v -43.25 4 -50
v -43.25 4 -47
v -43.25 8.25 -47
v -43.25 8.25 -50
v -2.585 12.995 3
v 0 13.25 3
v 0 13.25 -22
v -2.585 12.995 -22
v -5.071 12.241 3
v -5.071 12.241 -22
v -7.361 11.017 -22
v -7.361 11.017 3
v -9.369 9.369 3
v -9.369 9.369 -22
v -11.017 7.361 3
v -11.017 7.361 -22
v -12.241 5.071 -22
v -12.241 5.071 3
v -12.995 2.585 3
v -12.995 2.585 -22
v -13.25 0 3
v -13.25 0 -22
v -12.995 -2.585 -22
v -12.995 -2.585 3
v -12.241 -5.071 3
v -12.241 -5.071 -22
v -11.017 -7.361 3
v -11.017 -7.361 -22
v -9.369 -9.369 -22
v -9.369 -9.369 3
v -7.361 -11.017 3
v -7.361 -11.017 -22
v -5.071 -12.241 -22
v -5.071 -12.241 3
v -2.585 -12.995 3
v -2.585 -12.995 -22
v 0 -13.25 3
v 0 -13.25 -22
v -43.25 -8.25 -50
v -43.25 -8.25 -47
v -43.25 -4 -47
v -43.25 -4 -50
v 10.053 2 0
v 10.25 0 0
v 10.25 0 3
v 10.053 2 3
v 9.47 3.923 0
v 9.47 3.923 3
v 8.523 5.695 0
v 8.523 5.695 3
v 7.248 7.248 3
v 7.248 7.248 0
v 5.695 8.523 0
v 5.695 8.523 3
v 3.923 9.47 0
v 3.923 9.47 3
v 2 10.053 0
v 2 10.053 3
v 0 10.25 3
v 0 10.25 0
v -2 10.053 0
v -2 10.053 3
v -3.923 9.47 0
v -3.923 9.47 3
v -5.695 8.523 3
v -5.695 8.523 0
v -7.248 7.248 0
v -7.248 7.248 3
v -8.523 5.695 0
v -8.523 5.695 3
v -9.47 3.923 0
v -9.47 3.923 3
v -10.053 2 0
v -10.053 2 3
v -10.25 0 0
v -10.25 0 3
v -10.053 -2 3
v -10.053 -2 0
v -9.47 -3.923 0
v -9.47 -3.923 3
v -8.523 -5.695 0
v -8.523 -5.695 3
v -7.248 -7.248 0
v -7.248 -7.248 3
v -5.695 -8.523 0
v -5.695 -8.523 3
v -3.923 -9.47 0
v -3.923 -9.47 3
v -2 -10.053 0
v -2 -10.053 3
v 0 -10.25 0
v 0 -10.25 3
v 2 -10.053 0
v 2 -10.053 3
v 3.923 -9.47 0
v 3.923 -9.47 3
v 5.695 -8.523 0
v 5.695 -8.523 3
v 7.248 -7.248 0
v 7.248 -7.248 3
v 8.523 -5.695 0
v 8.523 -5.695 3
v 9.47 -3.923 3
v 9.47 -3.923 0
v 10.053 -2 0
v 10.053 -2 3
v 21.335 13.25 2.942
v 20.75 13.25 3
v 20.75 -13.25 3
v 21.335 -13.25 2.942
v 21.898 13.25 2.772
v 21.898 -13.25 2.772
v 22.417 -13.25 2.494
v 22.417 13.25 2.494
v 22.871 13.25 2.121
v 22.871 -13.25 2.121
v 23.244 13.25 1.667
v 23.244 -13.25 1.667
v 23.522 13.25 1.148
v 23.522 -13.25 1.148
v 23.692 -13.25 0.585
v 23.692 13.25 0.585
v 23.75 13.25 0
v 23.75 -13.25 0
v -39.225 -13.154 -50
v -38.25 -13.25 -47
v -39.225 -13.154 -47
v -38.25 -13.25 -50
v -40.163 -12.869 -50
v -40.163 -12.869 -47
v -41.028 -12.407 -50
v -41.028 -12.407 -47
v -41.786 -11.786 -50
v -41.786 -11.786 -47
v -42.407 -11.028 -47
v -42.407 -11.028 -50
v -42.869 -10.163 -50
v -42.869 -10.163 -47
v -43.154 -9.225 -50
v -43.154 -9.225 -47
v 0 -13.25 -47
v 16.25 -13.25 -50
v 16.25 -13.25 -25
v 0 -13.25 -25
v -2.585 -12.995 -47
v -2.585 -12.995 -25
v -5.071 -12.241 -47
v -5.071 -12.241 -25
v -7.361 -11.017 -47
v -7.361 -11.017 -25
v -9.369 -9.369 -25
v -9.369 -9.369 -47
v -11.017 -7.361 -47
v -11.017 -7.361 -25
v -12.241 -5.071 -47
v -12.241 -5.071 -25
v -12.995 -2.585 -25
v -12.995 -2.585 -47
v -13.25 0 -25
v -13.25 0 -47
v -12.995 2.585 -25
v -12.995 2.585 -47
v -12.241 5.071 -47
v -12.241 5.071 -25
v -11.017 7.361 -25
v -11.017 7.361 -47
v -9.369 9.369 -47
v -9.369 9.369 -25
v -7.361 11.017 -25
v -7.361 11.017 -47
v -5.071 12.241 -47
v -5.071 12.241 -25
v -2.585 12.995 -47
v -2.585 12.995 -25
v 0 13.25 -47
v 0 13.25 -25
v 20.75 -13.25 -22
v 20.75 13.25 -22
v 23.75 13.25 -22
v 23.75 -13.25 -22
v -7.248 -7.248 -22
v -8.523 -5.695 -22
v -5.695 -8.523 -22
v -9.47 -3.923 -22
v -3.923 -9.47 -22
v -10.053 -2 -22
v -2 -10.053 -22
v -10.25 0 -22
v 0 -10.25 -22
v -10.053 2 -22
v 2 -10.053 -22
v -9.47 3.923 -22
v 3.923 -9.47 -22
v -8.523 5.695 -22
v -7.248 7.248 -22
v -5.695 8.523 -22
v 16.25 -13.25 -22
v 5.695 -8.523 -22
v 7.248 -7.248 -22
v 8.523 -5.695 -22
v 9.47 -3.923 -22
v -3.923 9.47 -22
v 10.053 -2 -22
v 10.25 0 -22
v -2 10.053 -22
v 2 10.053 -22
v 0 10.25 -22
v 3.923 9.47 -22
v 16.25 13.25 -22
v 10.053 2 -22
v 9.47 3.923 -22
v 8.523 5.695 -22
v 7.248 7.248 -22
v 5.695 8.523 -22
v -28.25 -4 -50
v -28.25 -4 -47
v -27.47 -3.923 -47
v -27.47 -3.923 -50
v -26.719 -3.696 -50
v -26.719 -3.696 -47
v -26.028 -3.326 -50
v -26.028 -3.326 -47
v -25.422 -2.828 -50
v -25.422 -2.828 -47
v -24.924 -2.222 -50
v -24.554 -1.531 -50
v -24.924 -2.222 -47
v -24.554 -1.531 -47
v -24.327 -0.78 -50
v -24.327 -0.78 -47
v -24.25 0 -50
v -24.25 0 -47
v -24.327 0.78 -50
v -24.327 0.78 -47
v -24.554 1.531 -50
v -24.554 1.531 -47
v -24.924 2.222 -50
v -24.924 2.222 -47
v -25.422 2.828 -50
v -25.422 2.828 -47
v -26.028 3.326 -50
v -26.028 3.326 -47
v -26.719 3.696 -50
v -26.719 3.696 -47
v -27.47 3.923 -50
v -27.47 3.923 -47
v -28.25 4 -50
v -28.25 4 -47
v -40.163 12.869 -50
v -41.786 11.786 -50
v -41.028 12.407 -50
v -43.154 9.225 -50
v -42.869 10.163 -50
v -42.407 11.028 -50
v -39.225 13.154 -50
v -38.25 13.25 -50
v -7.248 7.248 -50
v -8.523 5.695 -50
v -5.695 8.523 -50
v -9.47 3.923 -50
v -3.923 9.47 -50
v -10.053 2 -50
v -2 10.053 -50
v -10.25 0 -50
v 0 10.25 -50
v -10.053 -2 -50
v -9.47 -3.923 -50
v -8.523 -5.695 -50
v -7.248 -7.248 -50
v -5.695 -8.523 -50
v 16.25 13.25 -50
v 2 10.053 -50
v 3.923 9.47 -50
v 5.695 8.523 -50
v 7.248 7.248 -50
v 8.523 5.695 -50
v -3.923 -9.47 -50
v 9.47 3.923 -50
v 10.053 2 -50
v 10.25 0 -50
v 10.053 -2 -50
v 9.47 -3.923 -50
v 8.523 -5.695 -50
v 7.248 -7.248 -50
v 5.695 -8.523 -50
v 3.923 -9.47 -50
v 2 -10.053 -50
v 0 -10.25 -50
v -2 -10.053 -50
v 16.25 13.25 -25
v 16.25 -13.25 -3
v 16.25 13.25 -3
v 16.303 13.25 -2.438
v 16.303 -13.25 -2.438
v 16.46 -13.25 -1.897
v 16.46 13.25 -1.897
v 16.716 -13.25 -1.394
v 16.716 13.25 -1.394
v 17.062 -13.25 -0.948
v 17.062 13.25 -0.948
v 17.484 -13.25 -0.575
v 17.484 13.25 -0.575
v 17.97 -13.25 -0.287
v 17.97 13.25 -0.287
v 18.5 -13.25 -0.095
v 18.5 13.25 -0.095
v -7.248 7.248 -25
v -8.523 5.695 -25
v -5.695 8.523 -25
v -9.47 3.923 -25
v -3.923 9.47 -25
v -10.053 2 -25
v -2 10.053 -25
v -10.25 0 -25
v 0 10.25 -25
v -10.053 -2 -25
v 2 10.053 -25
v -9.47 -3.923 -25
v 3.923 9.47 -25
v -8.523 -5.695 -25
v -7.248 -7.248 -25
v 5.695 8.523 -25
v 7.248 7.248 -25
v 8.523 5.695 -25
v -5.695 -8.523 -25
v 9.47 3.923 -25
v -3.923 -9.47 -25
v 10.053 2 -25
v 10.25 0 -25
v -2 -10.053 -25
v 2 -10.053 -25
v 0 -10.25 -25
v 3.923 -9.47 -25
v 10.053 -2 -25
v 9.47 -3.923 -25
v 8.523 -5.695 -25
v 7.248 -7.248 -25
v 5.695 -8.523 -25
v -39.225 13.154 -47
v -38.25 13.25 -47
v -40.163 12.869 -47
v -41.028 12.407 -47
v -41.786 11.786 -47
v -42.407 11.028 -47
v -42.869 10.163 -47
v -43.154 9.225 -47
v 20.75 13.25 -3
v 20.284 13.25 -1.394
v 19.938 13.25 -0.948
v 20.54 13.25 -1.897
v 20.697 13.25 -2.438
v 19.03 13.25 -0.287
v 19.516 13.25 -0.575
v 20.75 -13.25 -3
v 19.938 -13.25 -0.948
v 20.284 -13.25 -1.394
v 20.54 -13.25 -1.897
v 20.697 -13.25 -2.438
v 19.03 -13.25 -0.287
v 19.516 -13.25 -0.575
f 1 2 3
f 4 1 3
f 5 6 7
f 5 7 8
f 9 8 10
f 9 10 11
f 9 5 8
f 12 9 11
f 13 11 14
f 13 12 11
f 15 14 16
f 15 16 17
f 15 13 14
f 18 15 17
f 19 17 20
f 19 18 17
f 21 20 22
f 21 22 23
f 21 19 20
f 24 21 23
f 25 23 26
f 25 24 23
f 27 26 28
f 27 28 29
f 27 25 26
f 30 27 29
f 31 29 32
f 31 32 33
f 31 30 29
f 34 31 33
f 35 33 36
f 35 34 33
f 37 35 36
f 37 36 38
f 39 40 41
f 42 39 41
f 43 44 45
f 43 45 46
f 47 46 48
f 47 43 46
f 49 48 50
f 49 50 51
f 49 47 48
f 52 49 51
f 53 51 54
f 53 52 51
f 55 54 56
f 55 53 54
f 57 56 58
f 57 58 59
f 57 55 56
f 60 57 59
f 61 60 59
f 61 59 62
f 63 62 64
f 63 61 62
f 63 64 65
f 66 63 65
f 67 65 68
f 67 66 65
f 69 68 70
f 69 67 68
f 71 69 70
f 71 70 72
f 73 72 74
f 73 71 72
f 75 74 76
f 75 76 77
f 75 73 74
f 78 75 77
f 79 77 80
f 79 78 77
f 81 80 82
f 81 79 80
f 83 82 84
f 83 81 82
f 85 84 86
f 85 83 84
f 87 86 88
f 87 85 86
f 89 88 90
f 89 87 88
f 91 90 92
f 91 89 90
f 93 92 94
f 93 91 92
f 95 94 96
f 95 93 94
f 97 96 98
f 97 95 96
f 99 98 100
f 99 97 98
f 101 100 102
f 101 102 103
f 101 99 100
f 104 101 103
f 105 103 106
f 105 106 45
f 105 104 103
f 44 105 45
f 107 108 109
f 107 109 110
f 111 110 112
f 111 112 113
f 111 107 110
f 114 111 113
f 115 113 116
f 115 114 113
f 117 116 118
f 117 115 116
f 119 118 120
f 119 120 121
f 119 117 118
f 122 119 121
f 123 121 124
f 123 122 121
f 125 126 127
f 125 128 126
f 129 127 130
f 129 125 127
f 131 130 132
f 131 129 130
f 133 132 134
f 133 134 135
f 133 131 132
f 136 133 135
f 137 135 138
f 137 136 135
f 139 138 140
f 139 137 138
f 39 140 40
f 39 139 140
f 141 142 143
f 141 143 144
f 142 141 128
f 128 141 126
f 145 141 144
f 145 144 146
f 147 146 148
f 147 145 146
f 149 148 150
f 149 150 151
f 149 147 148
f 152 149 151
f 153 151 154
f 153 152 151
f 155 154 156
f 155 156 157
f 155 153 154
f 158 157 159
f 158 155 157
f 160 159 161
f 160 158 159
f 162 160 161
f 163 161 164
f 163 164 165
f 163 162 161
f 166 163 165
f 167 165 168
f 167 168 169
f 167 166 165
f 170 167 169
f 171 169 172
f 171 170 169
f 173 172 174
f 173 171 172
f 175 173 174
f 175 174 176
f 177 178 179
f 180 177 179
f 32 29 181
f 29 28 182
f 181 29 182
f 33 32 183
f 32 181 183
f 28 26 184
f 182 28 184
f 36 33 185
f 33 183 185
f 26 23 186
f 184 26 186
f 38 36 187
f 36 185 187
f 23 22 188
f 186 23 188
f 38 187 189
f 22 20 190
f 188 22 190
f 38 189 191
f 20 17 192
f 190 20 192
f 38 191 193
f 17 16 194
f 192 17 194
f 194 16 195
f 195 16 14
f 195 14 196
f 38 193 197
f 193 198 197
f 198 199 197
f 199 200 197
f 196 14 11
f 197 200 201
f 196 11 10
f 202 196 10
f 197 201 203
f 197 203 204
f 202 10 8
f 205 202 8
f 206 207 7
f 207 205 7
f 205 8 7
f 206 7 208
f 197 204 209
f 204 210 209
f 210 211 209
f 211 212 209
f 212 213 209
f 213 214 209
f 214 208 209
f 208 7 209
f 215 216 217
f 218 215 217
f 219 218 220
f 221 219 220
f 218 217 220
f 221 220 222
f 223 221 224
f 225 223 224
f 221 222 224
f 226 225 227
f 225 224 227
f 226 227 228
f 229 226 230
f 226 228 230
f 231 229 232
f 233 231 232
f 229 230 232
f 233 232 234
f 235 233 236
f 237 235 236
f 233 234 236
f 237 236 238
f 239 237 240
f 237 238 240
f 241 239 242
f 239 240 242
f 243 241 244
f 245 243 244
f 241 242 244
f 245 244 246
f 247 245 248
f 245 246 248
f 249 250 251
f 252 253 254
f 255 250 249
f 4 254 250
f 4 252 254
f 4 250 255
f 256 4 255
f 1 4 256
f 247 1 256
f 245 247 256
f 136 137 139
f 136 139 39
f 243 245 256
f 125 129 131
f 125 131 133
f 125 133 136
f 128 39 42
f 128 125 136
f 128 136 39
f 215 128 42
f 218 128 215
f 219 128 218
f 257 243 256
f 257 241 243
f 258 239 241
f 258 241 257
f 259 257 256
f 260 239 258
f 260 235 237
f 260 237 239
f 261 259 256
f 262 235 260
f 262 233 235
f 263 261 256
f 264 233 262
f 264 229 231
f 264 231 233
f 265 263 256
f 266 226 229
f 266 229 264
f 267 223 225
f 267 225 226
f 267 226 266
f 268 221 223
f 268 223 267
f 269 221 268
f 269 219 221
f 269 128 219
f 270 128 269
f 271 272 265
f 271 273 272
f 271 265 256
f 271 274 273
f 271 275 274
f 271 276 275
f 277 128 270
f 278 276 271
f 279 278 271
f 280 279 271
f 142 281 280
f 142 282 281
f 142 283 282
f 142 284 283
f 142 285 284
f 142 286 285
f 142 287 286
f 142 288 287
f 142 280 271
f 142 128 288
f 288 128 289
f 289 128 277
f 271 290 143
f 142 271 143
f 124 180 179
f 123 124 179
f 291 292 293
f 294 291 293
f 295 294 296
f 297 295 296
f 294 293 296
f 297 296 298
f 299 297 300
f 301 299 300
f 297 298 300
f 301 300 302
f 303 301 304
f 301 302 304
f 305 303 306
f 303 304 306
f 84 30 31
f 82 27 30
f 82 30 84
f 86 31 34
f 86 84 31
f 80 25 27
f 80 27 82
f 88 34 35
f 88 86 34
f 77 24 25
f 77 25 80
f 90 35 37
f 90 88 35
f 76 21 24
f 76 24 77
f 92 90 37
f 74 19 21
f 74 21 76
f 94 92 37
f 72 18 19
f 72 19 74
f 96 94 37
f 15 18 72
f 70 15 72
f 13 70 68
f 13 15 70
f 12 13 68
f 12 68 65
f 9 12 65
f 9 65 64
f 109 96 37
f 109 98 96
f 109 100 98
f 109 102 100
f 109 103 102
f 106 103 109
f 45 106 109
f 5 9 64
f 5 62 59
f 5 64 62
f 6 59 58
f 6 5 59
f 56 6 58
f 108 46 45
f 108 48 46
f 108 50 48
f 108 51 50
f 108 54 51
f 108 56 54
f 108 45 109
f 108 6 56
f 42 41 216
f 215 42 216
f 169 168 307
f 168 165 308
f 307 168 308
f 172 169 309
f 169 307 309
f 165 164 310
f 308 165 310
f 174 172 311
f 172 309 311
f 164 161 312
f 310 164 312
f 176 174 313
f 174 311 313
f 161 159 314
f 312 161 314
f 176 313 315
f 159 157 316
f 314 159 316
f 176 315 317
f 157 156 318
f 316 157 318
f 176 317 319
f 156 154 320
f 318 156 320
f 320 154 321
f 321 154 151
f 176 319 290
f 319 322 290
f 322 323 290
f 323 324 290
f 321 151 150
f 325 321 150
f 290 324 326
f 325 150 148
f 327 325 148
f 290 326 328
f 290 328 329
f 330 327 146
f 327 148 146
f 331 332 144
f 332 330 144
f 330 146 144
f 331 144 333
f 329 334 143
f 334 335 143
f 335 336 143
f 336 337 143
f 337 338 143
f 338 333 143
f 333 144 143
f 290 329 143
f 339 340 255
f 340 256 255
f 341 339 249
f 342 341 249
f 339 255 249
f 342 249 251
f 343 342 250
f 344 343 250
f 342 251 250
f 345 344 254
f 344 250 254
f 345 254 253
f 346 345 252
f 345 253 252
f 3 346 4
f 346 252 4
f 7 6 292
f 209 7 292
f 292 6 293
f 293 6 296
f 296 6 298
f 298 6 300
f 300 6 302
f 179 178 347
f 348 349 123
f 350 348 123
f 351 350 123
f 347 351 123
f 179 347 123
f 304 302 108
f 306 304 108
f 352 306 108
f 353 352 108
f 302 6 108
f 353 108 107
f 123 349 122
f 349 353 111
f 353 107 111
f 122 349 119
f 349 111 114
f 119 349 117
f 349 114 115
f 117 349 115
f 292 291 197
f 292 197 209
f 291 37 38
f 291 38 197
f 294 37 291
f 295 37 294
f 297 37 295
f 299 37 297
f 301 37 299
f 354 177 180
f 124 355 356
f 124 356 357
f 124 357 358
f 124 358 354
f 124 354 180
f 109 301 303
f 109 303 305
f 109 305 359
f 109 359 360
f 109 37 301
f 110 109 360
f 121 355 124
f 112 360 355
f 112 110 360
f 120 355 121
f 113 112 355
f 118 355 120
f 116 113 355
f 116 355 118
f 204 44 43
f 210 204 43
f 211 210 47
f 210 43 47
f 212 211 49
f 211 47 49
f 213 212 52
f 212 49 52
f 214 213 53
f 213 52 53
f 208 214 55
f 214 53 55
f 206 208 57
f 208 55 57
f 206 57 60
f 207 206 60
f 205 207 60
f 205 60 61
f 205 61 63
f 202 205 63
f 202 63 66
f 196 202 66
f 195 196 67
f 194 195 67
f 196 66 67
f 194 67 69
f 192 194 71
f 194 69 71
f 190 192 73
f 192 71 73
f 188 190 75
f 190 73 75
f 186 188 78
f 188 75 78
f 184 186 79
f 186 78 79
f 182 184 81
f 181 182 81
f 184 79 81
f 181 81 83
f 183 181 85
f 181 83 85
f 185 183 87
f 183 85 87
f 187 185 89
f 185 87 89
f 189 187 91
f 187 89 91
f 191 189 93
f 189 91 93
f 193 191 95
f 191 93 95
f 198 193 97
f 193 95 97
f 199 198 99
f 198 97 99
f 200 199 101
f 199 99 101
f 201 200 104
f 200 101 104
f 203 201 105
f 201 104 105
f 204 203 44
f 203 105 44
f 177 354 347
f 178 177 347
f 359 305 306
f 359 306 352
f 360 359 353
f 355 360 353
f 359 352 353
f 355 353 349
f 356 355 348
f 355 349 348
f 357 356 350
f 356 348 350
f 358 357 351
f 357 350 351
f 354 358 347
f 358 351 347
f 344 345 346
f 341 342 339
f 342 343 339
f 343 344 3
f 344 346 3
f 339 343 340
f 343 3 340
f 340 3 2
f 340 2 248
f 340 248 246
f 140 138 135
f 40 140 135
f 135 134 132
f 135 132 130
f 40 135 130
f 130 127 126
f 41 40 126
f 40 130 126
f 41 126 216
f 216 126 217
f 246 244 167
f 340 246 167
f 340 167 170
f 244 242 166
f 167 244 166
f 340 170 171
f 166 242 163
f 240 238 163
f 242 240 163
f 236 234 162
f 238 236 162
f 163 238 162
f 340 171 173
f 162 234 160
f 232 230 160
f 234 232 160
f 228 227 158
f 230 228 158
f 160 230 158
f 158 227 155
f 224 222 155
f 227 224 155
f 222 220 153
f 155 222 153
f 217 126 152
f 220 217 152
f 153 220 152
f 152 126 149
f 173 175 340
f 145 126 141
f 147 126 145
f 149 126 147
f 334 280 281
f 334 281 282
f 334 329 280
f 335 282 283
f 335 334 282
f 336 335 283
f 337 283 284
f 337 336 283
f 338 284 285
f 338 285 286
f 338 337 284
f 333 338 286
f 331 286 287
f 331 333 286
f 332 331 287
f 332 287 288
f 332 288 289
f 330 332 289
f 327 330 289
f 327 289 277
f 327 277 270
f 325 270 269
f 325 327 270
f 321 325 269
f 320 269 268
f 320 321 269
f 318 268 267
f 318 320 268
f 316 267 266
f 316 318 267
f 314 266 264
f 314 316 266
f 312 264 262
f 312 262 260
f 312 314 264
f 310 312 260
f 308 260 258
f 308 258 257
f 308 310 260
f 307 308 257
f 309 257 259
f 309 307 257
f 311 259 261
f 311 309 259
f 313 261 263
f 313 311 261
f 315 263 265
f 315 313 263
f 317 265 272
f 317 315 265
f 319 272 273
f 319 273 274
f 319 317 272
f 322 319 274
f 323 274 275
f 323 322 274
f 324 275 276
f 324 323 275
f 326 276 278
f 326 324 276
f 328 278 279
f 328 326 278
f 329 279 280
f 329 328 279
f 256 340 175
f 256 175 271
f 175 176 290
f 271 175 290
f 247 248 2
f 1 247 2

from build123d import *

# Parameters (mm, degrees)
F0_R        = 10.25
F0_W        = 4.5
F0_H        = 26.5
F0_W_2      = 3
F1_DEPTH    = 3
F2_DEPTH    = 22
F3_T1_DEPTH = 26.5
F3_T3_DEPTH = 41.5
F5_R        = 10.25
F6_DEPTH    = 22
F7_DEPTH    = 3
F8_R        = 5


# Not quite as in the source:
# - a fillet or chamfer that OpenCascade refuses, or shapes differently, is made with other operations: its cross-section is extruded or revolved along the edge and cut away or added


with BuildPart() as f1:
    # F0 (on Top) → F1 (new body)
    with BuildSketch(Plane.XY):
        with BuildLine():
            ThreePointArc((0, -13.25), (9.3691648507, -9.3691648507), (13.25, 0))
            ThreePointArc((13.25, 0), (9.3691648507, 9.3691648507), (0, 13.25))
            ThreePointArc((0, 13.25), (-13.25, 0), (0, -13.25))
        make_face()
        Circle(F0_R, mode=Mode.SUBTRACT)
        with BuildLine():
            Line((13.25, -13.25), (13.25, 0))
            ThreePointArc((13.25, 0), (9.3691648507, -9.3691648507), (0, -13.25))
            Line((0, -13.25), (13.25, -13.25))
        make_face()
        with BuildLine():
            ThreePointArc((0, 13.25), (9.3691648507, 9.3691648507), (13.25, 0))
            Line((13.25, 0), (13.25, 13.25))
            Line((13.25, 13.25), (0, 13.25))
        make_face()
        Polygon((13.25, 13.25), (13.25, 0), (13.25, -13.25), (16.25, -13.25), (16.25, 13.25), align=None)
        with Locations((18.5, 0)):
            Rectangle(F0_W, F0_H)
        with Locations((22.25, 0)):
            Rectangle(F0_W_2, F0_H)
    extrude(amount=F1_DEPTH)

    # F0 (on Top) → F2 (join)
    with BuildSketch(Plane.XY):
        with BuildLine():
            ThreePointArc((0, -13.25), (9.3691648507, -9.3691648507), (13.25, 0))
            ThreePointArc((13.25, 0), (9.3691648507, 9.3691648507), (0, 13.25))
            ThreePointArc((0, 13.25), (-13.25, 0), (0, -13.25))
        make_face()
        Circle(F0_R, mode=Mode.SUBTRACT)
        with BuildLine():
            ThreePointArc((0, 13.25), (9.3691648507, 9.3691648507), (13.25, 0))
            Line((13.25, 0), (13.25, 13.25))
            Line((13.25, 13.25), (0, 13.25))
        make_face()
        Polygon((13.25, 13.25), (13.25, 0), (13.25, -13.25), (16.25, -13.25), (16.25, 13.25), align=None)
        with Locations((22.25, 0)):
            Rectangle(F0_W_2, F0_H)
        with BuildLine():
            Line((13.25, -13.25), (13.25, 0))
            ThreePointArc((13.25, 0), (9.3691648507, -9.3691648507), (0, -13.25))
            Line((0, -13.25), (13.25, -13.25))
        make_face()
    extrude(amount=-F2_DEPTH)

    # F3: fillet of radius 3 on 3 edges, made by hand

    # F3_s2 → F3_t1 (join)
    with BuildSketch(Plane.XZ.offset(-13.25)):
        with BuildLine():
            ThreePointArc((16.25, -3), (17.1286796564, -0.8786796564), (19.25, 0))
            Line((19.25, 0), (16.25, 0))
            Line((16.25, 0), (16.25, -3))
        make_face()
        with BuildLine():
            ThreePointArc((17.75, 0), (19.8713203436, -0.8786796564), (20.75, -3))
            Line((20.75, -3), (20.75, 0))
            Line((20.75, 0), (17.75, 0))
        make_face()
    extrude(amount=F3_T1_DEPTH)

    # F3_s4 → F3_t3 (cut)
    with BuildSketch(Plane.XZ.offset(-20.75)):
        with BuildLine():
            ThreePointArc((20.75, 3), (22.8713203436, 2.1213203436), (23.75, 0))
            Line((23.75, 0), (23.75, 3))
            Line((23.75, 3), (20.75, 3))
        make_face()
    extrude(amount=F3_T3_DEPTH, mode=Mode.SUBTRACT)


with BuildPart() as f6:
    # F5 (on offset) → F6 (new body)
    with BuildSketch(Plane(origin=(0, 0, -47), x_dir=(1, 0, 0), z_dir=(0, 0, -1))):
        with BuildLine():
            Line((16.25, 13.25), (0, 13.25))
            ThreePointArc((0, 13.25), (-13.25, 0), (0, -13.25))
            Line((0, -13.25), (16.25, -13.25))
            Line((16.25, -13.25), (16.25, 13.25))
        make_face()
        Circle(F5_R, mode=Mode.SUBTRACT)
    extrude(amount=-F6_DEPTH)

    # F5 (on offset) → F7 (join)
    with BuildSketch(Plane(origin=(0, 0, -47), x_dir=(1, 0, 0), z_dir=(0, 0, -1))):
        with BuildLine():
            Line((16.25, 13.25), (0, 13.25))
            ThreePointArc((0, 13.25), (-13.25, 0), (0, -13.25))
            Line((0, -13.25), (16.25, -13.25))
            Line((16.25, -13.25), (16.25, 13.25))
        make_face()
        Circle(F5_R, mode=Mode.SUBTRACT)
        with BuildLine():
            ThreePointArc((0, -13.25), (-13.25, 0), (0, 13.25))
            Line((0, 13.25), (-43.25, 13.25))
            Line((-43.25, 13.25), (-43.25, 4))
            Line((-43.25, 4), (-28.25, 4))
            ThreePointArc((-28.25, 4), (-24.25, 0), (-28.25, -4))
            Line((-28.25, -4), (-43.25, -4))
            Line((-43.25, -4), (-43.25, -13.25))
            Line((-43.25, -13.25), (0, -13.25))
        make_face()
    extrude(amount=F7_DEPTH)

    # F8
    f8_edges = [f6.edges().sort_by_distance(p)[0] for p in [
        (-43.25, -13.25, -48.5),
        (-43.25, 13.25, -48.5),
    ]]
    fillet(f8_edges, radius=F8_R)


solid = Compound([f1.part, f6.part])
